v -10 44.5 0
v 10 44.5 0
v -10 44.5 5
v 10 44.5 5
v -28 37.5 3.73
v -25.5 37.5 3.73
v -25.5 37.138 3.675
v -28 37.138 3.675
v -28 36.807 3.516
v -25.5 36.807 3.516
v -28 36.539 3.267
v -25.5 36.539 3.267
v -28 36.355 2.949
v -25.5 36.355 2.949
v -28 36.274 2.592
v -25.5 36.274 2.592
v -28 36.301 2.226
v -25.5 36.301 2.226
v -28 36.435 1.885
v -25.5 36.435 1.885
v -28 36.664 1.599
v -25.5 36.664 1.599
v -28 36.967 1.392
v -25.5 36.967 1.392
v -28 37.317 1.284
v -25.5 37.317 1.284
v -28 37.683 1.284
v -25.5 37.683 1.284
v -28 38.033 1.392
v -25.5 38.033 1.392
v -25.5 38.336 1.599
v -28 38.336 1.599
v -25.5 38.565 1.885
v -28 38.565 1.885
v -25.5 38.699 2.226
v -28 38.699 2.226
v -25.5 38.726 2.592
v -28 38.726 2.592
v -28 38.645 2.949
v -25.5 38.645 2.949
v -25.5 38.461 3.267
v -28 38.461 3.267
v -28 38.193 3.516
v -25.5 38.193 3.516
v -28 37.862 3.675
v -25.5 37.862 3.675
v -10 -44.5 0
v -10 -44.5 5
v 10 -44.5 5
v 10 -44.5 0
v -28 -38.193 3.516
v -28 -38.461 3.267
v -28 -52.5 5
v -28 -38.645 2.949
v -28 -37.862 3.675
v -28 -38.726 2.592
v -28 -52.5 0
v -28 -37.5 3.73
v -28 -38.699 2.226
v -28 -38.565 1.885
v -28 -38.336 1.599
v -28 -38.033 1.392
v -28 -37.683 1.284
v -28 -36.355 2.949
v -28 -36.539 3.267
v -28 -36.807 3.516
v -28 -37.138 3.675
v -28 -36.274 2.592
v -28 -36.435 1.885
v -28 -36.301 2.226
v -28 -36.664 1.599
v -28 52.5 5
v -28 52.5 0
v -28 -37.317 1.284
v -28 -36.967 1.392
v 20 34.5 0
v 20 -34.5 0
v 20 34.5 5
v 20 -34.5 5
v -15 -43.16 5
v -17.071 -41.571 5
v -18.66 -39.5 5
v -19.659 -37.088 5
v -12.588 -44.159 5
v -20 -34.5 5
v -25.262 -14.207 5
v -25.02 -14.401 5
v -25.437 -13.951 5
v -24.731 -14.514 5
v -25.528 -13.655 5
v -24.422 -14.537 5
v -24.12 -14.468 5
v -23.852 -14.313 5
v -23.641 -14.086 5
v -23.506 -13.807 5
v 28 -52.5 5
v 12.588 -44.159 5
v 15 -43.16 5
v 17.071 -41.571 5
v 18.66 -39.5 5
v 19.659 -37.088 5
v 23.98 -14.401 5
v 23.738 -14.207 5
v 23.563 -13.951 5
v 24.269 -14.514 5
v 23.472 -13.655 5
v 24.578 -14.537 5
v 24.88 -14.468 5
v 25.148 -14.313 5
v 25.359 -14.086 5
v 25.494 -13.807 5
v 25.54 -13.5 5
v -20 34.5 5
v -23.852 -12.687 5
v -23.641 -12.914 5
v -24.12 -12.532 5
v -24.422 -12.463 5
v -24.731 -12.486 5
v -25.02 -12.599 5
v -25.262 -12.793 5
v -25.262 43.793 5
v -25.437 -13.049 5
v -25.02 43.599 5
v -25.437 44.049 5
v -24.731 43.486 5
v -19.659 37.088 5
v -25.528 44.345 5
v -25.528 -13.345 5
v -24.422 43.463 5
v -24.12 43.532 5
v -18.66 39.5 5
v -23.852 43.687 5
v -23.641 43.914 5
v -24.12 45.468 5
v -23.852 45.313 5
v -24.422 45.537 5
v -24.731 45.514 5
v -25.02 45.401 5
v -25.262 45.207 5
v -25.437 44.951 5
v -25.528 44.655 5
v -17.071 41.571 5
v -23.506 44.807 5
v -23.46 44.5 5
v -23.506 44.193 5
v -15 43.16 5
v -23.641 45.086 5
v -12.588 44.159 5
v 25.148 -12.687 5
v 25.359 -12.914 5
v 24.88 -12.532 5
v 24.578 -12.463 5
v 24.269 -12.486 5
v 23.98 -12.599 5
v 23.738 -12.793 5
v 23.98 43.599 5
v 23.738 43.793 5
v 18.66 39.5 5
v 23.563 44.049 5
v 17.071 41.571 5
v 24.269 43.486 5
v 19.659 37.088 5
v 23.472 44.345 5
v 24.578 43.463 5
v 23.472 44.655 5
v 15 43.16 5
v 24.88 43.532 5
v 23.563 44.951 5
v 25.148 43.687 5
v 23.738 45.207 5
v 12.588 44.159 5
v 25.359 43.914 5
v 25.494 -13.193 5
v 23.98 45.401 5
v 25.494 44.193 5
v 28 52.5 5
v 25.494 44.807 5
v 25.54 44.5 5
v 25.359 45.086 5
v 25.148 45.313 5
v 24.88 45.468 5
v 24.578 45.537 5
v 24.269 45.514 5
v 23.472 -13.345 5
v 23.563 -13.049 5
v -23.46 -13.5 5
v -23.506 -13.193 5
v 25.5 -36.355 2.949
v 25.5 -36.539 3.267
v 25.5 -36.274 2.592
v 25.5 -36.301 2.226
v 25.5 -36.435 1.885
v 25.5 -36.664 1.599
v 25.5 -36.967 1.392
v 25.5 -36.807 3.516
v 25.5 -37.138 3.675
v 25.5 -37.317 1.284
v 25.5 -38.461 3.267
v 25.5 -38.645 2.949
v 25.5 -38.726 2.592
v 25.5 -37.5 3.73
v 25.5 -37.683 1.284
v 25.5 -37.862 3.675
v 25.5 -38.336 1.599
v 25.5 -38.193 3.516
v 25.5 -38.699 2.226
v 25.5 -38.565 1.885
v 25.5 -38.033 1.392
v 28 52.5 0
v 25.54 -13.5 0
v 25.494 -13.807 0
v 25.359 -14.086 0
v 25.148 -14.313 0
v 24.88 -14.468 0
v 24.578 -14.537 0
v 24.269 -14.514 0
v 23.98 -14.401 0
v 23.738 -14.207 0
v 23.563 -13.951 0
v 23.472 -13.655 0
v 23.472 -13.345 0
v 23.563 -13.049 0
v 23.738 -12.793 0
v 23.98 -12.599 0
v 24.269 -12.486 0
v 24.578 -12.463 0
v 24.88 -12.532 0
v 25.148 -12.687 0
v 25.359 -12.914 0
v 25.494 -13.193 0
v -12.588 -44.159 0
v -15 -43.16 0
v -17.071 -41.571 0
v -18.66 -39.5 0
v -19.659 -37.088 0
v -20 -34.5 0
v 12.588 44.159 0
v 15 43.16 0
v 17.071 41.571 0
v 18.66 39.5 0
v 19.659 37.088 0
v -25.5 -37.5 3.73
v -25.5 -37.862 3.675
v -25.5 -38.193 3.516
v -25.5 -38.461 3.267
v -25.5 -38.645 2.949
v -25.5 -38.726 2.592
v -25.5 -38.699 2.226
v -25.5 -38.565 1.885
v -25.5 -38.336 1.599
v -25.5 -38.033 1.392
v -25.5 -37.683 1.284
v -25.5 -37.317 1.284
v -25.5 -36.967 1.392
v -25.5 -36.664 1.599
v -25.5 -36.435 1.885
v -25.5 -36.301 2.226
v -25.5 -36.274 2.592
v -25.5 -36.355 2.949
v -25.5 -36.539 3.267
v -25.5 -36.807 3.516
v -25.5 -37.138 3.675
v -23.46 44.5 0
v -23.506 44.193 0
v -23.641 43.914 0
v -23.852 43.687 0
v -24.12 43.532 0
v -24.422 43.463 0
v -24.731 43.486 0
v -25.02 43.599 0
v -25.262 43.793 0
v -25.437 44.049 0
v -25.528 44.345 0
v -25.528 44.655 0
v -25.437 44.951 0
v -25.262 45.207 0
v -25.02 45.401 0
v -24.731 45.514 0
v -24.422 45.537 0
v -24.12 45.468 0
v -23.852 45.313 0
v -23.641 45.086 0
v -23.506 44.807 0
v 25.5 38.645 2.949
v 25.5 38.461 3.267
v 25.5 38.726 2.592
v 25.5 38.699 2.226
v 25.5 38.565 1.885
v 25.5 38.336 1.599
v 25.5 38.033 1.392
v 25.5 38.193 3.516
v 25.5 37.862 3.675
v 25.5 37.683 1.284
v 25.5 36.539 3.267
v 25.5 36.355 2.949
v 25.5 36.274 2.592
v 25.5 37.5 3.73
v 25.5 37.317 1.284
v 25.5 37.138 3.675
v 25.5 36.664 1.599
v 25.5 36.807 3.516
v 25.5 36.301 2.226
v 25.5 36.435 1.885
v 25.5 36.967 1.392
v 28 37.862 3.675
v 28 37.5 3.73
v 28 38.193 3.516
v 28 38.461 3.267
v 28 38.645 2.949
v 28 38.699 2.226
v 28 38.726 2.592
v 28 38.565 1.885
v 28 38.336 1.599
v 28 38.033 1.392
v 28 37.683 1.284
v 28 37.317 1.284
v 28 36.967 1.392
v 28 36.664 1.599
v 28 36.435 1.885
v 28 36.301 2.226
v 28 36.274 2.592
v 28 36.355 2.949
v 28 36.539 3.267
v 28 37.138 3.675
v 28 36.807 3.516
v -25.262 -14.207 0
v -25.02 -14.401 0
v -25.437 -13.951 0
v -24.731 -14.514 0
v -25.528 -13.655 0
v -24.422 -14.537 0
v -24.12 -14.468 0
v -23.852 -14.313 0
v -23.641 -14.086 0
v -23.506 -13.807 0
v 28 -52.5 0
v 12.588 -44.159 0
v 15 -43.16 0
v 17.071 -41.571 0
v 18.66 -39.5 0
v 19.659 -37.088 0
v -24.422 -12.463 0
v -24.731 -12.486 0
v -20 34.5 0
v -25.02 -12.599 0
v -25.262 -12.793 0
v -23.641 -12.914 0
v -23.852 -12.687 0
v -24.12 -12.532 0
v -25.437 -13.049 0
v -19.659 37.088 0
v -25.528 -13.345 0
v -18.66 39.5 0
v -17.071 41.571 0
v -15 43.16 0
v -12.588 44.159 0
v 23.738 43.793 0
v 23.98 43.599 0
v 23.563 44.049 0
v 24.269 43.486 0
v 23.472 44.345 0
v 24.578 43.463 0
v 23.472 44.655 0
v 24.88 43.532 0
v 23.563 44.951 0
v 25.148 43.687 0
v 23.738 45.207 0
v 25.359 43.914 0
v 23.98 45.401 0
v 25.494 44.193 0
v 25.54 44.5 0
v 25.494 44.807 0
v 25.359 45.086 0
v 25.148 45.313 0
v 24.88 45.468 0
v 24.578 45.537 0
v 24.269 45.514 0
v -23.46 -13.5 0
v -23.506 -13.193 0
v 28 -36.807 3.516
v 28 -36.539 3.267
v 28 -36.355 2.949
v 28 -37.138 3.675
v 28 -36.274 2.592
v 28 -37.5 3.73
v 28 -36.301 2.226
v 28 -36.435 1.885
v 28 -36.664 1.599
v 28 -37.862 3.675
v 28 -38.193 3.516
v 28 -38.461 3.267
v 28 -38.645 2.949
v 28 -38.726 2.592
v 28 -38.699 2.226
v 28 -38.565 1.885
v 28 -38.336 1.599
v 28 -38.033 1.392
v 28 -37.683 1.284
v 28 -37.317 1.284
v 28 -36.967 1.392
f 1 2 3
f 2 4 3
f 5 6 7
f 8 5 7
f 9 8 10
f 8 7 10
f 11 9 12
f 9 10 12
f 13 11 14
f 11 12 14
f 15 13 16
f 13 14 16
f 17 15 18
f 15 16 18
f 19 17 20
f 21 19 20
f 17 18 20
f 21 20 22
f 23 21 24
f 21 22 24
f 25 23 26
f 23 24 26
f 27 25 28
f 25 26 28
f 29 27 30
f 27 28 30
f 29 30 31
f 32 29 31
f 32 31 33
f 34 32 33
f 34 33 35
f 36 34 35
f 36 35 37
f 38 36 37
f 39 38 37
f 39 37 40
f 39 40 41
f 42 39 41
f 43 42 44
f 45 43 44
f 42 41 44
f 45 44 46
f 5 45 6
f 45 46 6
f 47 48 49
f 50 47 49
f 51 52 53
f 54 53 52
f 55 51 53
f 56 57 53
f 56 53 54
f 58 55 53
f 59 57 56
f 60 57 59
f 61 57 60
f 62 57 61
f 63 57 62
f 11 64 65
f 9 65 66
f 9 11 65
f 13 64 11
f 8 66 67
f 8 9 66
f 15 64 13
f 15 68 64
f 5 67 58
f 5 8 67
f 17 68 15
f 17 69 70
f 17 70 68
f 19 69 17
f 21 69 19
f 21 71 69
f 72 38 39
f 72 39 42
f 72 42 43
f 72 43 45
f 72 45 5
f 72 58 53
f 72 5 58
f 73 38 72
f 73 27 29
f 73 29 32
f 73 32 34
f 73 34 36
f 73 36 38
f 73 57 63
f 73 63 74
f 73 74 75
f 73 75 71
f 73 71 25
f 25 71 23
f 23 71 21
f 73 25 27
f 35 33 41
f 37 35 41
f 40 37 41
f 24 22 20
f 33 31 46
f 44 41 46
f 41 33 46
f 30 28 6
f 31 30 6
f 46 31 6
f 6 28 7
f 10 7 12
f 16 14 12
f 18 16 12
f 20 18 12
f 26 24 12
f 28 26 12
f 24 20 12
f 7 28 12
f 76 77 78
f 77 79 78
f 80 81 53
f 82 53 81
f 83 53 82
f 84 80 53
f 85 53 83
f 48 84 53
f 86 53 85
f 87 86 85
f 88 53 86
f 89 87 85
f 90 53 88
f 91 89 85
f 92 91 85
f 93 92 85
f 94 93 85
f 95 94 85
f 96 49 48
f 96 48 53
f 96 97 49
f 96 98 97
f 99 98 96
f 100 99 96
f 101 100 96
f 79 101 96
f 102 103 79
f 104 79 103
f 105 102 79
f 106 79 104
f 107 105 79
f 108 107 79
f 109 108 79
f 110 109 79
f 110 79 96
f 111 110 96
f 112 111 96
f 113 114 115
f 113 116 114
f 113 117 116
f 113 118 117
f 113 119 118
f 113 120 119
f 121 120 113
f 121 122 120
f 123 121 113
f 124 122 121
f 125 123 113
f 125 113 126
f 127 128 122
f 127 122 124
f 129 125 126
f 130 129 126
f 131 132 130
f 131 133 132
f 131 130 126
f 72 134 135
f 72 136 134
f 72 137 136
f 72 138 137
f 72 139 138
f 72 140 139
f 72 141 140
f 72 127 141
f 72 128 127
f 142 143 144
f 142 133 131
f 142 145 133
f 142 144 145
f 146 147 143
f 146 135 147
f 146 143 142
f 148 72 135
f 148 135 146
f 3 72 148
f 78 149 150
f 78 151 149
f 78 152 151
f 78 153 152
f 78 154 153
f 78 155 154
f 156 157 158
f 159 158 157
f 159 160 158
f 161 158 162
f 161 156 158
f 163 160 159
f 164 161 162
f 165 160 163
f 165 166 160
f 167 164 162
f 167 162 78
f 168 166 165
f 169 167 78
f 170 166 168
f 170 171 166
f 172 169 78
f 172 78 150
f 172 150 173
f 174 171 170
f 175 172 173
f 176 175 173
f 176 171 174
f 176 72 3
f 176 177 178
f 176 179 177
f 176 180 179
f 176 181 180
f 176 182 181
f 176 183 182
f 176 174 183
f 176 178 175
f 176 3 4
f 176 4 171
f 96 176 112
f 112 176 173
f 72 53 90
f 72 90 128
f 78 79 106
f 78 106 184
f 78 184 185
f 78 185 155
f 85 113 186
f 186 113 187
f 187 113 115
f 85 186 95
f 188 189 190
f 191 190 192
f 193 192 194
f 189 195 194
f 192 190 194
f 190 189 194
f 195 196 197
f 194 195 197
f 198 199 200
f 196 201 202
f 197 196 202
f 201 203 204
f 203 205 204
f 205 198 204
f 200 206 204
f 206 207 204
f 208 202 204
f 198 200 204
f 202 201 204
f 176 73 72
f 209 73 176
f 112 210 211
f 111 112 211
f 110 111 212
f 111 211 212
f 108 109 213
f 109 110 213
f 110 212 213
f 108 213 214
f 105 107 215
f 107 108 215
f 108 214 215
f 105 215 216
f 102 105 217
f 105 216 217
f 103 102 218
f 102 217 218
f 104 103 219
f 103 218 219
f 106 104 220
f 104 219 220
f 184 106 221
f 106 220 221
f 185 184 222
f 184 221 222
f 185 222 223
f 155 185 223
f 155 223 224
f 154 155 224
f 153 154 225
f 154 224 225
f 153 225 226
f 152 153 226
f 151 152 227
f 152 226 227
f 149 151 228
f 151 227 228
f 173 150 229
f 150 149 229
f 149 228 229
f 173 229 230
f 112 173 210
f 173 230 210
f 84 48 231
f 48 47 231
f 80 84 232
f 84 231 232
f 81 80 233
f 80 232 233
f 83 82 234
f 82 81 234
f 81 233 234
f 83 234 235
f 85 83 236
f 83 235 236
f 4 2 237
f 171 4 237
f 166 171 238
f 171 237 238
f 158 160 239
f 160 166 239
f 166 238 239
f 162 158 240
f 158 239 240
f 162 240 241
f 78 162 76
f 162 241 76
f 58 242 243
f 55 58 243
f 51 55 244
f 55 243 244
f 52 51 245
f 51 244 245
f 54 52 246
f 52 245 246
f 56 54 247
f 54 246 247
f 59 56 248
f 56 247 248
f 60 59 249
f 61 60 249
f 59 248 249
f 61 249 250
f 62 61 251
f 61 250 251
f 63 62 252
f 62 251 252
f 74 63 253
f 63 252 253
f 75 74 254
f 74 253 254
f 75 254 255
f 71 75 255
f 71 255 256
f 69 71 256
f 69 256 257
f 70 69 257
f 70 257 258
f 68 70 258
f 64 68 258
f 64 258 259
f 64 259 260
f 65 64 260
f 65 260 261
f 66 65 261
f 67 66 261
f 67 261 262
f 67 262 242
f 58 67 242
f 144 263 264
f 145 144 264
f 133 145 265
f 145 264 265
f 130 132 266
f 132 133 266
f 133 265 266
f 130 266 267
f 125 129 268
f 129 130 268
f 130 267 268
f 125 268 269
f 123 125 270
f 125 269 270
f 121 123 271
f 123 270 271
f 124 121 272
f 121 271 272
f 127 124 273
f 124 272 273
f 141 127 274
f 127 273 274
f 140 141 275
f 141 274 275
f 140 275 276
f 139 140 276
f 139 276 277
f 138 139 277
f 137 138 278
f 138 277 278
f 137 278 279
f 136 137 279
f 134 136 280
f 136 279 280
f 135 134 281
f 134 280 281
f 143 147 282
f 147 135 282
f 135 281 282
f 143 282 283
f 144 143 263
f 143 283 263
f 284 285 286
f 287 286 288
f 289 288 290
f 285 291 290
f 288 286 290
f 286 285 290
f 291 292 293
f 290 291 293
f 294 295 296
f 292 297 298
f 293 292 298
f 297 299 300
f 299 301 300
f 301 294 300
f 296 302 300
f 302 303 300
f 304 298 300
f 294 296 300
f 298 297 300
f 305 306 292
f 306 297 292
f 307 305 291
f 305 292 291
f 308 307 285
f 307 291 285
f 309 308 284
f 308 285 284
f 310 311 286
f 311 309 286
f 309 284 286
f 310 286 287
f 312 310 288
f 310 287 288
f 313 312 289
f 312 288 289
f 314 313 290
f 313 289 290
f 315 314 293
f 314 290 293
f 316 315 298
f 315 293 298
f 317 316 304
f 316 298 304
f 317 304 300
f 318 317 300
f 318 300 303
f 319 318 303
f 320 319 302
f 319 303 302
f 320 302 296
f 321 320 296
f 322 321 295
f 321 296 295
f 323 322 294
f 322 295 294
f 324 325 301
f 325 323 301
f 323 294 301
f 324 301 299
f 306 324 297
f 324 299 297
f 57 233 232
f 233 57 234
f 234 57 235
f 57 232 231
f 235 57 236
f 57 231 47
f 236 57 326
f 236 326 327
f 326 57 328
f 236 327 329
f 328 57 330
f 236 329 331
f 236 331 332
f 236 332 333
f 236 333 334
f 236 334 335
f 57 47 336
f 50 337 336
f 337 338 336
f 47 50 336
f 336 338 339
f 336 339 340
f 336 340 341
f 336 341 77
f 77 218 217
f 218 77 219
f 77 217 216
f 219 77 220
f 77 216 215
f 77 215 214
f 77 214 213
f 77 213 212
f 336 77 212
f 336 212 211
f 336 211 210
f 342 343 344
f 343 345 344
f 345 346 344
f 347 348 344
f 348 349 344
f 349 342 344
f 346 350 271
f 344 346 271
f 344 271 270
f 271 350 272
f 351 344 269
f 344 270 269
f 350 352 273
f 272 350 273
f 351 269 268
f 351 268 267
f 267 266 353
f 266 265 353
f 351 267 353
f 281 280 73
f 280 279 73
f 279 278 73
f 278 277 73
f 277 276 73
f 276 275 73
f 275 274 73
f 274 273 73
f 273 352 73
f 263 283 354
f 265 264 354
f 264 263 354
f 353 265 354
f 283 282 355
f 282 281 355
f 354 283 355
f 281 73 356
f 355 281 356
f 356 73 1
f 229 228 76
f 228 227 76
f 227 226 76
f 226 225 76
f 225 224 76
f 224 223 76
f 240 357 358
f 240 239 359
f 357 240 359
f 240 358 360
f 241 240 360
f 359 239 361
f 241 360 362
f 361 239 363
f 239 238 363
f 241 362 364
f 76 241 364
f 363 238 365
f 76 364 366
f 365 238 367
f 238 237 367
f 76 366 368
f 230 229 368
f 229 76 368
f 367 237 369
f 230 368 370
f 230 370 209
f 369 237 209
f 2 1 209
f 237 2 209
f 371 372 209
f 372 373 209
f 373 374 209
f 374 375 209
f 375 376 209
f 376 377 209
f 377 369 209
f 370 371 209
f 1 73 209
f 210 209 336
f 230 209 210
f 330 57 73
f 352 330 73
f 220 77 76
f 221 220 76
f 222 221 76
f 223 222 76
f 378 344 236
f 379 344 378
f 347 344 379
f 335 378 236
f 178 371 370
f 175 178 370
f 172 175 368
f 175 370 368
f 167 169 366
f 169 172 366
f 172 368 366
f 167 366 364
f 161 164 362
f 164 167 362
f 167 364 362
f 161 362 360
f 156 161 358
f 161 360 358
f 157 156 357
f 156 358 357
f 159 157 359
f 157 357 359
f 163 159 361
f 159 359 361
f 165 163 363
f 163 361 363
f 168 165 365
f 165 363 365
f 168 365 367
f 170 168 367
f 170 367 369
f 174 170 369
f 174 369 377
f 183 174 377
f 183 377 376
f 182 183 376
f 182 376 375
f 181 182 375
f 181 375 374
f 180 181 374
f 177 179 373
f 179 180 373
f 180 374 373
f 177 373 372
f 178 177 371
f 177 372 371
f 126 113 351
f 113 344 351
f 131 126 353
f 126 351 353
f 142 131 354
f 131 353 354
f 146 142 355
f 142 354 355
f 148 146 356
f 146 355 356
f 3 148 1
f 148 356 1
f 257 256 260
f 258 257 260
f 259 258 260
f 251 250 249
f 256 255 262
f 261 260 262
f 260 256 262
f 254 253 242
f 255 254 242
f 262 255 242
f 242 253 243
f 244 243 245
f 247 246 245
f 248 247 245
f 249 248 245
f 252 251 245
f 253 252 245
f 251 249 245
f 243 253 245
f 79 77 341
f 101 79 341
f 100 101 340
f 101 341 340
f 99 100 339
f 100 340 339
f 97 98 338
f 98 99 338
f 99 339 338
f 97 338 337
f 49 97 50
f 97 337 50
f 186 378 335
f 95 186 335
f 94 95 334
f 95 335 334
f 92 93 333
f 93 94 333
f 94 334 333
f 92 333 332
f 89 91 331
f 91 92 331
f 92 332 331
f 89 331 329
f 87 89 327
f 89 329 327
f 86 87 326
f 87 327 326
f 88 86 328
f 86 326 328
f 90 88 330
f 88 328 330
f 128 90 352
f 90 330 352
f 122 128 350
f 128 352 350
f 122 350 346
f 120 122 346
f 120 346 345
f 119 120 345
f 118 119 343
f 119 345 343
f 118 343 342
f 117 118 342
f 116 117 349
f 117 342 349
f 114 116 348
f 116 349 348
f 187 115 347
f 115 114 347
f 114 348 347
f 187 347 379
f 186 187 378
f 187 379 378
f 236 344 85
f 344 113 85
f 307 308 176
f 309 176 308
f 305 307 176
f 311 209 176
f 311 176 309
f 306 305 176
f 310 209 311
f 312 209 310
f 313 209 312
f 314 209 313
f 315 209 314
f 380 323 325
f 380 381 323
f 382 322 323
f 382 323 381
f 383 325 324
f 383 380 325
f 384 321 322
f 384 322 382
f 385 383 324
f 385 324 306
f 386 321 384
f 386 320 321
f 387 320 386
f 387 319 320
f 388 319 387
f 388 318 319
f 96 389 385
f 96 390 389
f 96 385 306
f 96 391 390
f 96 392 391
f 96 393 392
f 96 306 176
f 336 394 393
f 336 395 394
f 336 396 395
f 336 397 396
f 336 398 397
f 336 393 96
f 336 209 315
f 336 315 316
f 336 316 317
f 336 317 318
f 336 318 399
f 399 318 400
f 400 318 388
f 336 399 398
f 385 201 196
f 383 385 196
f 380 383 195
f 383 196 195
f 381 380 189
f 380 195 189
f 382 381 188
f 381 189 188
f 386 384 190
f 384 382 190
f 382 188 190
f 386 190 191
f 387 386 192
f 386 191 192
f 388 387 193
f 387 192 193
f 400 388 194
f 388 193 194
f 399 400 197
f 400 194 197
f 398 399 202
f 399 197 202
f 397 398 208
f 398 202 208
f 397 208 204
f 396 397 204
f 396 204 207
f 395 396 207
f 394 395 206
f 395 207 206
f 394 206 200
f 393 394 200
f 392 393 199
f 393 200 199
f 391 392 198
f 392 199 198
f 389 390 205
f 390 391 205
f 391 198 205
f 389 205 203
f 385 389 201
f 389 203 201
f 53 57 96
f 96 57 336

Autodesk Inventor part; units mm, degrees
ref_plane "YZ Plane" through (0, 0, 0) normal (1, 0, 0) x (0, 1, 0)
ref_plane "XZ Plane" through (0, 0, 0) normal (0, 1, 0) x (-1, 0, 0)
ref_plane "XY Plane" through (0, 0, 0) normal (0, 0, 1) x (1, 0, 0)
sketch "スケッチ1" plane through (0, 0, 0) normal (0, 0, 1) x (1, 0, 0)
  line L0 (-28, -52.5) -> (28, -52.5) construction
  line L1 (28, -52.5) -> (28, 52.5) construction
  line L2 (28, 52.5) -> (-28, 52.5) construction
  line L3 (-28, 52.5) -> (-28, -52.5) construction
  line L4 (-28, -52.5) -> (28, 52.5) construction
  line L5 (28, -52.5) -> (-28, 52.5) construction
  line L6 (-28, -52.5) -> (-28, 52.5)
  line L7 (-28, 52.5) -> (28, 52.5)
  line L8 (28, 52.5) -> (28, -52.5)
  line L9 (-28, -52.5) -> (28, -52.5)
  line L10 (0, 0) -> (0, 52.5) construction
  line L11 (0, 0) -> (28, 0) construction
  line L12 (-24.5, 44.5) -> (24.5, 44.5) construction
  line L13 (24.5, 44.5) -> (24.5, -13.5) construction
  line L14 (24.5, -13.5) -> (-24.5, -13.5) construction
  line L15 (-24.5, -13.5) -> (-24.5, 44.5) construction
  line L16 (-24.5, 44.5) -> (24.5, -13.5) construction
  line L17 (24.5, 44.5) -> (-24.5, -13.5) construction
  circle A0 centre (-24.5, 44.5) radius 1.04
  circle A1 centre (-24.5, -13.5) radius 1.04
  circle A2 centre (24.5, -13.5) radius 1.04
  circle A3 centre (24.5, 44.5) radius 1.04
  point P0 (0, 15.5)
  point P1 (0, 15.5)
  point P2 (0, 0)
  dimension "d9" = 56
  dimension "d12" = 105
  dimension "d52" = 2.08
  dimension "d53" = 49
  dimension "d54" = 58
  dimension "d55" = 8
extrude "押し出し1" add sketch "スケッチ1" along normal blind 5
sketch "スケッチ3" plane through (0, 0, 5) normal (0, 0, 1) x (1, 0, 0)
  line L0 (28, 52.5) -> (-28, 52.5) projected
  line L1 (-28, 52.5) -> (-28, -52.5) projected
  line L2 (-20, -44.5) -> (20, -44.5)
  line L3 (20, -44.5) -> (20, 44.5)
  line L4 (20, 44.5) -> (-20, 44.5)
  line L5 (-20, 44.5) -> (-20, -44.5)
  line L6 (-20, -44.5) -> (20, 44.5) construction
  line L7 (20, -44.5) -> (-20, 44.5) construction
  point P0 (-28, 42.1)
  point P1 (0, 0)
  dimension "d47" = 8
  dimension "d48" = 8
extrude "押し出し3" cut sketch "スケッチ3" against normal blind 10
fillet "フィレット1" radius 10 4 edges at (-20, 44.5, 2.5) (20, 44.5, 2.5) (20, -44.5, 2.5) (-20, -44.5, 2.5)
sketch "スケッチ4" plane through (-28, -52.5, 0) normal (-1, 0, 0) x (0, 0, 1)
  line L0 (0, 0) -> (5, 0) projected
  line L1 (0, 105) -> (5, 105) projected
  point P0 (0, 52.5)
  point P1 (2.5, 90)
  point P2 (2.5, 15)
  point P3 (2.5, 105)
  dimension "d73" = 15
  dimension "d74" = 15
hole "穴1" at (-28, 37.5, 2.5) at (-28, -37.5, 2.5) direction (1, 0, 0) diameter 2.459 depth 2.5 thread size "M3x0.5" class "6H" standard "ISO Metric profile"
mirror "ミラー1" about plane through (0, 0, 0) normal (1, 0, 0) of "穴1"
equation "\"d12\" = d19"
equation "\"d55\" = d69"
equation "\"d47\" = d48"
equation "\"d73\" = d21"
equation "\"d74\" = d22"
equation "\"d19\" = 105"
equation "\"d69\" = 8"
equation "\"d21\" = 15"
equation "\"d22\" = 15"
properties part number "コックピット_2_サブフレーム_1" material "アセタール樹脂、黒"
